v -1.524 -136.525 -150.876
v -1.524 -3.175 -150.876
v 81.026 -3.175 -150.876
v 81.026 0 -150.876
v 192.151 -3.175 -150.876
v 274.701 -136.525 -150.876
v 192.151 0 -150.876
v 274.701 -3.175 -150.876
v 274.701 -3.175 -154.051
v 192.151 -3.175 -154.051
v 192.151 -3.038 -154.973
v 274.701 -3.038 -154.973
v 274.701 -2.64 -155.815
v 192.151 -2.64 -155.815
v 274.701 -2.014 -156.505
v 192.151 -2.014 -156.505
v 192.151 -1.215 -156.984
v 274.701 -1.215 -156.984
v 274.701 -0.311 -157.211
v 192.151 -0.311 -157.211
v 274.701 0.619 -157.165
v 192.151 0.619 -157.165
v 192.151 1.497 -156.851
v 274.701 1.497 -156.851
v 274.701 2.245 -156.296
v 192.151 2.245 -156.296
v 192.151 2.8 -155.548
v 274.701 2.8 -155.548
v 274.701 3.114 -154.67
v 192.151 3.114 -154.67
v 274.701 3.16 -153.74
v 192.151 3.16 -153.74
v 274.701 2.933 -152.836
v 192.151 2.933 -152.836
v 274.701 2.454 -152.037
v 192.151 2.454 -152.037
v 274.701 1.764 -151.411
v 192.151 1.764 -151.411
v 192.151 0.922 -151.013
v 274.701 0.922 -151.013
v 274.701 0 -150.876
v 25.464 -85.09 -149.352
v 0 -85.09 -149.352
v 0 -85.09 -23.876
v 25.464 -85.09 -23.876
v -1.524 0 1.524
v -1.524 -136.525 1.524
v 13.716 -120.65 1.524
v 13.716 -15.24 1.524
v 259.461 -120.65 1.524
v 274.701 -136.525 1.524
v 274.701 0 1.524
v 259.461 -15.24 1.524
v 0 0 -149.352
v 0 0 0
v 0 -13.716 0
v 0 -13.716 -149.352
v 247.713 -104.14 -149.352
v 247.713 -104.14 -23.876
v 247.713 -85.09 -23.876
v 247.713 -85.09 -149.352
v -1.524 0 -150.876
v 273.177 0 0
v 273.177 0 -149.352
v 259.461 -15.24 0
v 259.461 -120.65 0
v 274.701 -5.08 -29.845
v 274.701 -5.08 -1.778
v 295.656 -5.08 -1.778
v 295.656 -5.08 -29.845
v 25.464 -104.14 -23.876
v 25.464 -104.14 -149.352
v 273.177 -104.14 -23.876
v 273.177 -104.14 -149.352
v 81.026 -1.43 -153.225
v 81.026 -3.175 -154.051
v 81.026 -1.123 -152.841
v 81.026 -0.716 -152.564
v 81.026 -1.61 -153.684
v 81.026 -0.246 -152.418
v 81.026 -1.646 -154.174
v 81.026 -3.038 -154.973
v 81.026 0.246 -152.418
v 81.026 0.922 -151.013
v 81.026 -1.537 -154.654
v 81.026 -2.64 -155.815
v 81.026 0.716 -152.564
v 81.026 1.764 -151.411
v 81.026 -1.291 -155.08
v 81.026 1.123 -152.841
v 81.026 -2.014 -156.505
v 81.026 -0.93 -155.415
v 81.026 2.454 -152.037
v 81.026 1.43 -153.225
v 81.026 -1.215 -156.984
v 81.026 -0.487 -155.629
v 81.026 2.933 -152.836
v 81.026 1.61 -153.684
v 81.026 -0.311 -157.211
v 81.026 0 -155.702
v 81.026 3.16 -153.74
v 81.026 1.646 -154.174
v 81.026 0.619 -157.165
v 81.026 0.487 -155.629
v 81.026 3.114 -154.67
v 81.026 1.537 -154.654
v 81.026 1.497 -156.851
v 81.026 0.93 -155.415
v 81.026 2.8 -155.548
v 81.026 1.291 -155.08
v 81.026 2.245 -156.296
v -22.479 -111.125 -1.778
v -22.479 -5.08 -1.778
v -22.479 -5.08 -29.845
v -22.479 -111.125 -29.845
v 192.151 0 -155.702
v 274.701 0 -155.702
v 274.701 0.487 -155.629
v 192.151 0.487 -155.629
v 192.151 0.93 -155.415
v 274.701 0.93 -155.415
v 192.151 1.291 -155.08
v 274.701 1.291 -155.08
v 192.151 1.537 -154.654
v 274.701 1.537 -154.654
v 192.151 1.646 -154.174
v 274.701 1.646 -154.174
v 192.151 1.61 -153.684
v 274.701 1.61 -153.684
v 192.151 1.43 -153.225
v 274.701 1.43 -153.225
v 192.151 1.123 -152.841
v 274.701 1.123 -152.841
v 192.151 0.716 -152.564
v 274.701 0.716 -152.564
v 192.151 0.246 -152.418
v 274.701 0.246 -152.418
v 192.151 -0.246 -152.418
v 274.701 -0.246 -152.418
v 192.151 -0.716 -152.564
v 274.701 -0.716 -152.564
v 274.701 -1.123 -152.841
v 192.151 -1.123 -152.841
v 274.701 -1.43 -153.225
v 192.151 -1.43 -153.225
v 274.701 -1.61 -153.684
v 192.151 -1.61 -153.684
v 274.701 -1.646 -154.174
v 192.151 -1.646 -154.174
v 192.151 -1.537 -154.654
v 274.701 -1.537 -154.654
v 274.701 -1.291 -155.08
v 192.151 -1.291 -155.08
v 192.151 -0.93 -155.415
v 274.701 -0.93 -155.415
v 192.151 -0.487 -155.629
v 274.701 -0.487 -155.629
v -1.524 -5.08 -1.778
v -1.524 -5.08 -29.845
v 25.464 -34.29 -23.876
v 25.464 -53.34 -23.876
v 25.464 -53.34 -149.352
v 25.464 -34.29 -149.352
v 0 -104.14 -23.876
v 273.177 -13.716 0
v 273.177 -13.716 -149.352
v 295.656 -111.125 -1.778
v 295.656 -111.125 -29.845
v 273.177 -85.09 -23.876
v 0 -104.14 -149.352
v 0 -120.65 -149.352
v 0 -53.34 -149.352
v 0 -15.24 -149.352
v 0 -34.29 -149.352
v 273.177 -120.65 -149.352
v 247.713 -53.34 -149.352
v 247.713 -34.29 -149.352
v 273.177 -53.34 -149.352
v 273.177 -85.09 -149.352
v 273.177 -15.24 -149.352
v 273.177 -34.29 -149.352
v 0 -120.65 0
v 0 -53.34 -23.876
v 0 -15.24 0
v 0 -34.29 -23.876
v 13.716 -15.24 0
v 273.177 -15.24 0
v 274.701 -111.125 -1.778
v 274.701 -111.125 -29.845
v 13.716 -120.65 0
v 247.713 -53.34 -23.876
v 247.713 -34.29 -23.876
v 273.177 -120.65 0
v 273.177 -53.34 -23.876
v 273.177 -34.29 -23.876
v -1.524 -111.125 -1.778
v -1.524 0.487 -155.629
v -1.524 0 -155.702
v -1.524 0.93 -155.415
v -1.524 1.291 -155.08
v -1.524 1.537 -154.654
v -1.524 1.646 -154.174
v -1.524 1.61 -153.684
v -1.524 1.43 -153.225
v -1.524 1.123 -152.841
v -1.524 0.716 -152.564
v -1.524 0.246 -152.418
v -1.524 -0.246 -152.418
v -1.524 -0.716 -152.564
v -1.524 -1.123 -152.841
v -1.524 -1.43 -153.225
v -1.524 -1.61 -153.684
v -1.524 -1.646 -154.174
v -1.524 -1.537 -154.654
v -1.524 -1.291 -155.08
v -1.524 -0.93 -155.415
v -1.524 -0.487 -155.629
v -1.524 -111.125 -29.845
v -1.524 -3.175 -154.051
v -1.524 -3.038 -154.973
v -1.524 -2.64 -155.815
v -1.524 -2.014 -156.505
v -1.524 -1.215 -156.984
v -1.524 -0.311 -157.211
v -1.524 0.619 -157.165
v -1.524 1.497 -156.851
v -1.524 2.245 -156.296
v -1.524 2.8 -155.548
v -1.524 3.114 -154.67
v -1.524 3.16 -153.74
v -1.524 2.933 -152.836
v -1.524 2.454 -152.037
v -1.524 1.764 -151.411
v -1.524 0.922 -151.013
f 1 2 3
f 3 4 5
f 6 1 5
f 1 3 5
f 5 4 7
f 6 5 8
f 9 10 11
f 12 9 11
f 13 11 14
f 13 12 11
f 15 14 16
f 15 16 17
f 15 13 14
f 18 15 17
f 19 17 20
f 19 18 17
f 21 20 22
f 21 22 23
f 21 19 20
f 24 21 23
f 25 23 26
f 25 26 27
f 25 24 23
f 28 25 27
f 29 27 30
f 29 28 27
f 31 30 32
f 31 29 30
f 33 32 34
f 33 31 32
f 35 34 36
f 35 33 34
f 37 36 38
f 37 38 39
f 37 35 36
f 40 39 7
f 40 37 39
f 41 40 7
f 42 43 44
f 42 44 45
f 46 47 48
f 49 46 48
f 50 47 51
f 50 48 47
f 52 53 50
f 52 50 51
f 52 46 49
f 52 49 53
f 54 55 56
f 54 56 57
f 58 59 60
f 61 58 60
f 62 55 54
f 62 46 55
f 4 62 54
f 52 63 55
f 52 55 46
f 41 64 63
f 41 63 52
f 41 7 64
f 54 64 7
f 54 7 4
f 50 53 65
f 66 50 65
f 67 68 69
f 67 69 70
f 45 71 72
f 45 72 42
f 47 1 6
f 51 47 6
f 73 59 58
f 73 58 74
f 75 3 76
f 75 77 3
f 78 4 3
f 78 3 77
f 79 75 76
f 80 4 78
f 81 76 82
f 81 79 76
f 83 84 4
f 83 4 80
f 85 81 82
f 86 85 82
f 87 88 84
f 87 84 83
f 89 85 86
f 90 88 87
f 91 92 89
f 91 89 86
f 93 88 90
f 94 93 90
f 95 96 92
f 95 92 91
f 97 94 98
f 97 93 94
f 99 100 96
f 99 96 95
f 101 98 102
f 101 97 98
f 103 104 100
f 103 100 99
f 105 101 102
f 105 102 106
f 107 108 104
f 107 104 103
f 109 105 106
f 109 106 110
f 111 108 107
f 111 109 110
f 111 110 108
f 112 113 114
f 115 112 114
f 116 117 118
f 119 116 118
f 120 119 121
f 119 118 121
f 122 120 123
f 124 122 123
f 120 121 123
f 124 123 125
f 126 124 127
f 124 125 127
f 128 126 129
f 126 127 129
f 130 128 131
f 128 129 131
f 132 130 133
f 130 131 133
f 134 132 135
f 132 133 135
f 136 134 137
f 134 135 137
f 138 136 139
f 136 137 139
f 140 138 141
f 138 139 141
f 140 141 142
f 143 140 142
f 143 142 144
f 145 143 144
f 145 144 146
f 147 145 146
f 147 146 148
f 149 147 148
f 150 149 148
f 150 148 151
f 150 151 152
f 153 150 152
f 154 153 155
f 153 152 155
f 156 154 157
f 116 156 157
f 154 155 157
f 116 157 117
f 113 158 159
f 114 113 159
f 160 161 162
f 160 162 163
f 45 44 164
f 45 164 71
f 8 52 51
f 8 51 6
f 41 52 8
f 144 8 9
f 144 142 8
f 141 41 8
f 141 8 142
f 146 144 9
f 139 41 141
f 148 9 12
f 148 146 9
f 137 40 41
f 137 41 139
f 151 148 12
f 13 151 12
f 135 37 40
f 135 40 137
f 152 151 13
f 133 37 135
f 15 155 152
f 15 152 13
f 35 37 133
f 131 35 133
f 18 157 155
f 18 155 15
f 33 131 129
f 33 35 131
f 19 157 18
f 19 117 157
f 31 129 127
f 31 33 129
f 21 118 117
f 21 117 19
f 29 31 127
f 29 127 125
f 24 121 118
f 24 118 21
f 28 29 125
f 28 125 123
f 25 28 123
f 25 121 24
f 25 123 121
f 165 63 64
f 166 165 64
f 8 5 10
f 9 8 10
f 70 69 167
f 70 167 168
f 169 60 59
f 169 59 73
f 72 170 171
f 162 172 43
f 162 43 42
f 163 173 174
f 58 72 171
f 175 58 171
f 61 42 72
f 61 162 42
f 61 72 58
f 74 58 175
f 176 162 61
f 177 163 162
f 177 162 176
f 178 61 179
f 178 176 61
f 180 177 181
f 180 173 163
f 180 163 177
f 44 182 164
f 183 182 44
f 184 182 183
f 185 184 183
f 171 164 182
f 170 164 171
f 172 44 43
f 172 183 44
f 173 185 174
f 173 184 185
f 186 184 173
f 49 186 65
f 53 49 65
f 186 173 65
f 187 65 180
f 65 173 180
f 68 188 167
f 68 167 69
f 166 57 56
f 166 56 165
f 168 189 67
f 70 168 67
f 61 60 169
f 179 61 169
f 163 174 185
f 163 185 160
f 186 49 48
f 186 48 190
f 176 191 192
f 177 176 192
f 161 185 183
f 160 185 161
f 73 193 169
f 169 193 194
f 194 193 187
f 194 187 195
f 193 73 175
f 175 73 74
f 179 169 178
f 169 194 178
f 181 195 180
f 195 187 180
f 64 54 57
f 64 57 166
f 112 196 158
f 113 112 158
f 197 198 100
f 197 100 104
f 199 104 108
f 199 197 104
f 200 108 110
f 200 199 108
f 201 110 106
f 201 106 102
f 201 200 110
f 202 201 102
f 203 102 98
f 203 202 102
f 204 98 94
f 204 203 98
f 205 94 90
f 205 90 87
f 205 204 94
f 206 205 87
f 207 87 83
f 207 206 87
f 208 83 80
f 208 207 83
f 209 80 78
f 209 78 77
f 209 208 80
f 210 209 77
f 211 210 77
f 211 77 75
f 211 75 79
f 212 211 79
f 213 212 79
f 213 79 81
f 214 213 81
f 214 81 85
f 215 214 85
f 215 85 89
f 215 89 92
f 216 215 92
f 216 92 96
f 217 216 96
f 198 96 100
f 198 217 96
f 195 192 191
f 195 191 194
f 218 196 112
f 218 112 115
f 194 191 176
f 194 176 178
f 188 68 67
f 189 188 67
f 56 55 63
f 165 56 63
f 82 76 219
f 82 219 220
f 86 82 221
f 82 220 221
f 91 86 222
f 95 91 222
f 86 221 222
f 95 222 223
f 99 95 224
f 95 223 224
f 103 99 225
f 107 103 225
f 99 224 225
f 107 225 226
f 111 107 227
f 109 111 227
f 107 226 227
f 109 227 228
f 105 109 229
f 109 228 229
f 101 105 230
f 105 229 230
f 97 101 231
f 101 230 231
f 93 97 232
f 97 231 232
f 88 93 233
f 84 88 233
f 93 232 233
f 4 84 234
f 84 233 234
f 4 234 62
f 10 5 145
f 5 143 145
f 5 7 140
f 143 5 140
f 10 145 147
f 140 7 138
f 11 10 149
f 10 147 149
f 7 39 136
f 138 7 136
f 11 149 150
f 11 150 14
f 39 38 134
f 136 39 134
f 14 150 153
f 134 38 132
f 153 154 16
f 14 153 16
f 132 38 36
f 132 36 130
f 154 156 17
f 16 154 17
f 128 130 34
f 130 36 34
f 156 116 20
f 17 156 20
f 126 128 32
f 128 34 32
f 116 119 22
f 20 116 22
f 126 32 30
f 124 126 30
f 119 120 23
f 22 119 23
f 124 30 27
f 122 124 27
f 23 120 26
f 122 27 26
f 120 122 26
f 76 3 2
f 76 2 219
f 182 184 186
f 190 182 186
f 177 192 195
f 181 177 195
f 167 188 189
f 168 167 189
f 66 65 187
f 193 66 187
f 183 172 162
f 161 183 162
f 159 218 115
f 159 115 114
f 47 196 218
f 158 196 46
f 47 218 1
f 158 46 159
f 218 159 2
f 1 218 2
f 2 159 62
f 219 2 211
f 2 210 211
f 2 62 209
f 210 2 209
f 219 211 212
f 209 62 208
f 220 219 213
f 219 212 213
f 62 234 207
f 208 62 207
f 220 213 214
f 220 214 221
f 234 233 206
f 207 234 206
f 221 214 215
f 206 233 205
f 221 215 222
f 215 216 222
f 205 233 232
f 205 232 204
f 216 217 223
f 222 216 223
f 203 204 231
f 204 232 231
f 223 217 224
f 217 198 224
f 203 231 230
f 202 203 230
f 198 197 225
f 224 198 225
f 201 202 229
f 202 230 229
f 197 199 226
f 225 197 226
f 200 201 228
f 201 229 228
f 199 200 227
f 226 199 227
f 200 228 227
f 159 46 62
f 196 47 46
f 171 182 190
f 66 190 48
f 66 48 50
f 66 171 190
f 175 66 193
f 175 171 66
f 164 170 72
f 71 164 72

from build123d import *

# Parameters (mm, degrees)
SKETCH1_W                           = 276.225
SKETCH1_H                           = 152.4
BULK_EXTRUDE_DEPTH                  = 136.525
SKETCH1_13_W                        = 273.177
SKETCH1_13_H                        = 149.352
SKETCH1_13_W_2                      = 245.745
SKETCH1_13_H_2                      = 1.524
INNER_SHELL_CUT_DEPTH               = 120.65
SKETCH1_14_W                        = 245.745
SKETCH1_14_H                        = 1.524
TOP_WALL_EXTRUDE_DEPTH              = 15.24
TOP_START                           = -15.24
SKETCH1_15_W                        = 273.177
SKETCH1_15_H                        = 149.352
TOP_FLOOR_EXTRUDE_DEPTH             = 1.524
SKETCH5_R                           = 1.651
HINGE_EXTRUDE_DEPTH                 = 82.55
SKETCH7_W                           = 25.4635
SKETCH7_H                           = 19.05
RAILS_EXTRUDE_DEPTH                 = 125.476
SKETCH9_W                           = 28.067
SKETCH9_H                           = 106.045
LATCH_CLEAR_BOX_RIGHT_EXTRUDE_DEPTH = 20.955


with BuildPart() as part:
    # Sketch1 → Bulk-Extrude (new body)
    with BuildSketch(Plane(origin=(0, 0, 0), x_dir=(1, 0, 0), z_dir=(0, 1, 0))):
        with Locations((136.5885, 74.676)):
            Rectangle(SKETCH1_W, SKETCH1_H)
    extrude(amount=-BULK_EXTRUDE_DEPTH)

    # Sketch1<13> → Inner Shell-Cut (cut)
    with BuildSketch(Plane(origin=(0, 0, 0), x_dir=(1, 0, 0), z_dir=(0, 1, 0))):
        with Locations((136.5885, 74.676)):
            Rectangle(SKETCH1_13_W, SKETCH1_13_H)
        with Locations((136.5885, -0.762)):
            Rectangle(SKETCH1_13_W_2, SKETCH1_13_H_2)
    extrude(amount=-INNER_SHELL_CUT_DEPTH, mode=Mode.SUBTRACT)

    # Sketch1<14> → Top Wall-Extrude (add)
    with BuildSketch(Plane(origin=(0, 0, 0), x_dir=(1, 0, 0), z_dir=(0, 1, 0))):
        with Locations((136.5885, -0.762)):
            Rectangle(SKETCH1_14_W, SKETCH1_14_H)
    extrude(amount=-TOP_WALL_EXTRUDE_DEPTH)

    # Sketch1<15> → Top Floor-Extrude (add)
    with BuildSketch(Plane(origin=(0, 0, 0), x_dir=(1, 0, 0), z_dir=(0, 1, 0)).offset(TOP_START)):
        with Locations((136.5885, 74.676)):
            Rectangle(SKETCH1_15_W, SKETCH1_15_H)
    extrude(amount=TOP_FLOOR_EXTRUDE_DEPTH)

    # Sketch5 → Hinge-Extrude (add)
    with BuildSketch(Plane(origin=(274.701, 0, 0), x_dir=(0, 0, -1), z_dir=(1, 0, 0))):
        with BuildLine():
            Line((150.876, 0), (150.876, -3.175))
            Line((150.876, -3.175), (154.051, -3.175))
            ThreePointArc((154.051, -3.175), (156.29606403, 2.24506403), (150.876, 0))
        make_face()
        with Locations((154.051, 0)):
            Circle(SKETCH5_R, mode=Mode.SUBTRACT)
    hinge_extrude = extrude(amount=-HINGE_EXTRUDE_DEPTH)

    # Mirror1: Hinge-Extrude across plane
    add(hinge_extrude.mirror(Plane(origin=(136.5885, 0, 0), x_dir=(0, 0, 1), z_dir=(1, 0, 0))))

    # Sketch7 → Rails-Extrude (add)
    with BuildSketch(Plane.XY.offset(-149.352)):
        with Locations((12.73175, -43.815)):
            Rectangle(SKETCH7_W, SKETCH7_H)
        with Locations((260.44525, -43.815)):
            Rectangle(SKETCH7_W, SKETCH7_H)
        with Locations((12.73175, -94.615)):
            Rectangle(SKETCH7_W, SKETCH7_H)
        with Locations((260.44525, -94.615)):
            Rectangle(SKETCH7_W, SKETCH7_H)
    extrude(amount=RAILS_EXTRUDE_DEPTH)


with BuildPart() as body_2:
    # Sketch9 → Latch Clear. Box, Right-Extrude (new body)
    with BuildSketch(Plane(origin=(274.701, 0, 0), x_dir=(0, 0, -1), z_dir=(1, 0, 0))):
        with Locations((15.8115, -58.1025)):
            Rectangle(SKETCH9_W, SKETCH9_H)
    latch_clear_box_right_extrude = extrude(amount=LATCH_CLEAR_BOX_RIGHT_EXTRUDE_DEPTH)


with BuildPart() as part_1:
    add(part.part)

    # Latch Clear. Box, Left-Mirror: Latch Clear. Box, Right-Extrude across plane
    add(latch_clear_box_right_extrude.mirror(Plane(origin=(136.5885, 0, 0), x_dir=(0, 0, 1), z_dir=(1, 0, 0))))


solid = Compound([body_2.part, part_1.part])
